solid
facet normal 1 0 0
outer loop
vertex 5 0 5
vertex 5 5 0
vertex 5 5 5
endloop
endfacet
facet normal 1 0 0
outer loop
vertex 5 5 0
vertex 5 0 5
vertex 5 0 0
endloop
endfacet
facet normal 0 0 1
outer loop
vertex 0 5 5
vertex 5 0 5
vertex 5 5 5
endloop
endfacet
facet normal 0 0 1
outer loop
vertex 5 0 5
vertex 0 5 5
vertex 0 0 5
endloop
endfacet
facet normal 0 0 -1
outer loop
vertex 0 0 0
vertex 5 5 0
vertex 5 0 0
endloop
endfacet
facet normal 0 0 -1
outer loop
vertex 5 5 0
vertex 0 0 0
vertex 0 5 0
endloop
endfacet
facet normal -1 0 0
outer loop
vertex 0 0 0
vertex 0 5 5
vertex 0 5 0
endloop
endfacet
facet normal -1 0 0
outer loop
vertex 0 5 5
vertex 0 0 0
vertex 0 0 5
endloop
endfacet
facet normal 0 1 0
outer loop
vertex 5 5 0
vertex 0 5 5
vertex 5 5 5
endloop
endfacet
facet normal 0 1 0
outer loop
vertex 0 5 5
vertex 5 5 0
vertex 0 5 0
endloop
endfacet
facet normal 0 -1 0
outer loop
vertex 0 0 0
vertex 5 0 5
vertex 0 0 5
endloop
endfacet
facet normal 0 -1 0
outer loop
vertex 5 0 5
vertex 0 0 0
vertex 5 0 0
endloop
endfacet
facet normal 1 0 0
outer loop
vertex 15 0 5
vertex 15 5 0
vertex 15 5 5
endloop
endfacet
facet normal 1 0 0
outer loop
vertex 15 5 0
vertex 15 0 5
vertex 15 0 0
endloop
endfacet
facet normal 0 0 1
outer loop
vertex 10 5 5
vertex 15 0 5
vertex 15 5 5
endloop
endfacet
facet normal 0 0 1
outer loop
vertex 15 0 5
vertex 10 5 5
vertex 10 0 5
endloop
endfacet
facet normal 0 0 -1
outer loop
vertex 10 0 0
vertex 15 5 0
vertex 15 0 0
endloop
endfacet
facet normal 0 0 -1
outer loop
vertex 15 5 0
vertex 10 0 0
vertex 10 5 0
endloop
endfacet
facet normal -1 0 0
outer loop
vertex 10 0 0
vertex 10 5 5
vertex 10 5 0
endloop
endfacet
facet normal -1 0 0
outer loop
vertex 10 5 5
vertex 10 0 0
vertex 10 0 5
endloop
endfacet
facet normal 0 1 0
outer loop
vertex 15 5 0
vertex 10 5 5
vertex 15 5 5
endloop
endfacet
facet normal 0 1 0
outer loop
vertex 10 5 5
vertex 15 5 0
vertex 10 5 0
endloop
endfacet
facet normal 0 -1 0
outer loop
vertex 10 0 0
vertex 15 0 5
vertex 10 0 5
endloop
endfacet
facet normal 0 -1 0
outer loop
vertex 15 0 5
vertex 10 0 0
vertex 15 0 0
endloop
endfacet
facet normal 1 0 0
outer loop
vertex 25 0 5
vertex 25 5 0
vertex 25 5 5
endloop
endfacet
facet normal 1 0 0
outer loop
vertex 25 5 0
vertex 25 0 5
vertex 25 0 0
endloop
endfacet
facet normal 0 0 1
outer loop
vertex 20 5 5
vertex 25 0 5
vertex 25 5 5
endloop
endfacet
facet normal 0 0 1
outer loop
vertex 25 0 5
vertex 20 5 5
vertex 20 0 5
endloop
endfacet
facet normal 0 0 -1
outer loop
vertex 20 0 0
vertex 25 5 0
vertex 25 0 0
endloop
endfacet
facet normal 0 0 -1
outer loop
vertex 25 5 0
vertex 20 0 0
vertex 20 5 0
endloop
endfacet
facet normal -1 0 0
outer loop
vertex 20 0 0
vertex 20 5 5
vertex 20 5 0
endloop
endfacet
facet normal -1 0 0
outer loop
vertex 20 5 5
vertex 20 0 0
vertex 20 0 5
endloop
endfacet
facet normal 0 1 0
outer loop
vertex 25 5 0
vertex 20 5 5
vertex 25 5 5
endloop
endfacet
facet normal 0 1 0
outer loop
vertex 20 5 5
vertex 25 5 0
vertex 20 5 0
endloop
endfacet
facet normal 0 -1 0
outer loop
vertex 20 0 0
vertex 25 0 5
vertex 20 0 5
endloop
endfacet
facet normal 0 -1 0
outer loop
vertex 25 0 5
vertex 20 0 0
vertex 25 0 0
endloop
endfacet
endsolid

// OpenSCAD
// expect: assign() was removed
for (i = [0:2]) assign(x = i * 10) translate([x, 0, 0]) cube(5);
